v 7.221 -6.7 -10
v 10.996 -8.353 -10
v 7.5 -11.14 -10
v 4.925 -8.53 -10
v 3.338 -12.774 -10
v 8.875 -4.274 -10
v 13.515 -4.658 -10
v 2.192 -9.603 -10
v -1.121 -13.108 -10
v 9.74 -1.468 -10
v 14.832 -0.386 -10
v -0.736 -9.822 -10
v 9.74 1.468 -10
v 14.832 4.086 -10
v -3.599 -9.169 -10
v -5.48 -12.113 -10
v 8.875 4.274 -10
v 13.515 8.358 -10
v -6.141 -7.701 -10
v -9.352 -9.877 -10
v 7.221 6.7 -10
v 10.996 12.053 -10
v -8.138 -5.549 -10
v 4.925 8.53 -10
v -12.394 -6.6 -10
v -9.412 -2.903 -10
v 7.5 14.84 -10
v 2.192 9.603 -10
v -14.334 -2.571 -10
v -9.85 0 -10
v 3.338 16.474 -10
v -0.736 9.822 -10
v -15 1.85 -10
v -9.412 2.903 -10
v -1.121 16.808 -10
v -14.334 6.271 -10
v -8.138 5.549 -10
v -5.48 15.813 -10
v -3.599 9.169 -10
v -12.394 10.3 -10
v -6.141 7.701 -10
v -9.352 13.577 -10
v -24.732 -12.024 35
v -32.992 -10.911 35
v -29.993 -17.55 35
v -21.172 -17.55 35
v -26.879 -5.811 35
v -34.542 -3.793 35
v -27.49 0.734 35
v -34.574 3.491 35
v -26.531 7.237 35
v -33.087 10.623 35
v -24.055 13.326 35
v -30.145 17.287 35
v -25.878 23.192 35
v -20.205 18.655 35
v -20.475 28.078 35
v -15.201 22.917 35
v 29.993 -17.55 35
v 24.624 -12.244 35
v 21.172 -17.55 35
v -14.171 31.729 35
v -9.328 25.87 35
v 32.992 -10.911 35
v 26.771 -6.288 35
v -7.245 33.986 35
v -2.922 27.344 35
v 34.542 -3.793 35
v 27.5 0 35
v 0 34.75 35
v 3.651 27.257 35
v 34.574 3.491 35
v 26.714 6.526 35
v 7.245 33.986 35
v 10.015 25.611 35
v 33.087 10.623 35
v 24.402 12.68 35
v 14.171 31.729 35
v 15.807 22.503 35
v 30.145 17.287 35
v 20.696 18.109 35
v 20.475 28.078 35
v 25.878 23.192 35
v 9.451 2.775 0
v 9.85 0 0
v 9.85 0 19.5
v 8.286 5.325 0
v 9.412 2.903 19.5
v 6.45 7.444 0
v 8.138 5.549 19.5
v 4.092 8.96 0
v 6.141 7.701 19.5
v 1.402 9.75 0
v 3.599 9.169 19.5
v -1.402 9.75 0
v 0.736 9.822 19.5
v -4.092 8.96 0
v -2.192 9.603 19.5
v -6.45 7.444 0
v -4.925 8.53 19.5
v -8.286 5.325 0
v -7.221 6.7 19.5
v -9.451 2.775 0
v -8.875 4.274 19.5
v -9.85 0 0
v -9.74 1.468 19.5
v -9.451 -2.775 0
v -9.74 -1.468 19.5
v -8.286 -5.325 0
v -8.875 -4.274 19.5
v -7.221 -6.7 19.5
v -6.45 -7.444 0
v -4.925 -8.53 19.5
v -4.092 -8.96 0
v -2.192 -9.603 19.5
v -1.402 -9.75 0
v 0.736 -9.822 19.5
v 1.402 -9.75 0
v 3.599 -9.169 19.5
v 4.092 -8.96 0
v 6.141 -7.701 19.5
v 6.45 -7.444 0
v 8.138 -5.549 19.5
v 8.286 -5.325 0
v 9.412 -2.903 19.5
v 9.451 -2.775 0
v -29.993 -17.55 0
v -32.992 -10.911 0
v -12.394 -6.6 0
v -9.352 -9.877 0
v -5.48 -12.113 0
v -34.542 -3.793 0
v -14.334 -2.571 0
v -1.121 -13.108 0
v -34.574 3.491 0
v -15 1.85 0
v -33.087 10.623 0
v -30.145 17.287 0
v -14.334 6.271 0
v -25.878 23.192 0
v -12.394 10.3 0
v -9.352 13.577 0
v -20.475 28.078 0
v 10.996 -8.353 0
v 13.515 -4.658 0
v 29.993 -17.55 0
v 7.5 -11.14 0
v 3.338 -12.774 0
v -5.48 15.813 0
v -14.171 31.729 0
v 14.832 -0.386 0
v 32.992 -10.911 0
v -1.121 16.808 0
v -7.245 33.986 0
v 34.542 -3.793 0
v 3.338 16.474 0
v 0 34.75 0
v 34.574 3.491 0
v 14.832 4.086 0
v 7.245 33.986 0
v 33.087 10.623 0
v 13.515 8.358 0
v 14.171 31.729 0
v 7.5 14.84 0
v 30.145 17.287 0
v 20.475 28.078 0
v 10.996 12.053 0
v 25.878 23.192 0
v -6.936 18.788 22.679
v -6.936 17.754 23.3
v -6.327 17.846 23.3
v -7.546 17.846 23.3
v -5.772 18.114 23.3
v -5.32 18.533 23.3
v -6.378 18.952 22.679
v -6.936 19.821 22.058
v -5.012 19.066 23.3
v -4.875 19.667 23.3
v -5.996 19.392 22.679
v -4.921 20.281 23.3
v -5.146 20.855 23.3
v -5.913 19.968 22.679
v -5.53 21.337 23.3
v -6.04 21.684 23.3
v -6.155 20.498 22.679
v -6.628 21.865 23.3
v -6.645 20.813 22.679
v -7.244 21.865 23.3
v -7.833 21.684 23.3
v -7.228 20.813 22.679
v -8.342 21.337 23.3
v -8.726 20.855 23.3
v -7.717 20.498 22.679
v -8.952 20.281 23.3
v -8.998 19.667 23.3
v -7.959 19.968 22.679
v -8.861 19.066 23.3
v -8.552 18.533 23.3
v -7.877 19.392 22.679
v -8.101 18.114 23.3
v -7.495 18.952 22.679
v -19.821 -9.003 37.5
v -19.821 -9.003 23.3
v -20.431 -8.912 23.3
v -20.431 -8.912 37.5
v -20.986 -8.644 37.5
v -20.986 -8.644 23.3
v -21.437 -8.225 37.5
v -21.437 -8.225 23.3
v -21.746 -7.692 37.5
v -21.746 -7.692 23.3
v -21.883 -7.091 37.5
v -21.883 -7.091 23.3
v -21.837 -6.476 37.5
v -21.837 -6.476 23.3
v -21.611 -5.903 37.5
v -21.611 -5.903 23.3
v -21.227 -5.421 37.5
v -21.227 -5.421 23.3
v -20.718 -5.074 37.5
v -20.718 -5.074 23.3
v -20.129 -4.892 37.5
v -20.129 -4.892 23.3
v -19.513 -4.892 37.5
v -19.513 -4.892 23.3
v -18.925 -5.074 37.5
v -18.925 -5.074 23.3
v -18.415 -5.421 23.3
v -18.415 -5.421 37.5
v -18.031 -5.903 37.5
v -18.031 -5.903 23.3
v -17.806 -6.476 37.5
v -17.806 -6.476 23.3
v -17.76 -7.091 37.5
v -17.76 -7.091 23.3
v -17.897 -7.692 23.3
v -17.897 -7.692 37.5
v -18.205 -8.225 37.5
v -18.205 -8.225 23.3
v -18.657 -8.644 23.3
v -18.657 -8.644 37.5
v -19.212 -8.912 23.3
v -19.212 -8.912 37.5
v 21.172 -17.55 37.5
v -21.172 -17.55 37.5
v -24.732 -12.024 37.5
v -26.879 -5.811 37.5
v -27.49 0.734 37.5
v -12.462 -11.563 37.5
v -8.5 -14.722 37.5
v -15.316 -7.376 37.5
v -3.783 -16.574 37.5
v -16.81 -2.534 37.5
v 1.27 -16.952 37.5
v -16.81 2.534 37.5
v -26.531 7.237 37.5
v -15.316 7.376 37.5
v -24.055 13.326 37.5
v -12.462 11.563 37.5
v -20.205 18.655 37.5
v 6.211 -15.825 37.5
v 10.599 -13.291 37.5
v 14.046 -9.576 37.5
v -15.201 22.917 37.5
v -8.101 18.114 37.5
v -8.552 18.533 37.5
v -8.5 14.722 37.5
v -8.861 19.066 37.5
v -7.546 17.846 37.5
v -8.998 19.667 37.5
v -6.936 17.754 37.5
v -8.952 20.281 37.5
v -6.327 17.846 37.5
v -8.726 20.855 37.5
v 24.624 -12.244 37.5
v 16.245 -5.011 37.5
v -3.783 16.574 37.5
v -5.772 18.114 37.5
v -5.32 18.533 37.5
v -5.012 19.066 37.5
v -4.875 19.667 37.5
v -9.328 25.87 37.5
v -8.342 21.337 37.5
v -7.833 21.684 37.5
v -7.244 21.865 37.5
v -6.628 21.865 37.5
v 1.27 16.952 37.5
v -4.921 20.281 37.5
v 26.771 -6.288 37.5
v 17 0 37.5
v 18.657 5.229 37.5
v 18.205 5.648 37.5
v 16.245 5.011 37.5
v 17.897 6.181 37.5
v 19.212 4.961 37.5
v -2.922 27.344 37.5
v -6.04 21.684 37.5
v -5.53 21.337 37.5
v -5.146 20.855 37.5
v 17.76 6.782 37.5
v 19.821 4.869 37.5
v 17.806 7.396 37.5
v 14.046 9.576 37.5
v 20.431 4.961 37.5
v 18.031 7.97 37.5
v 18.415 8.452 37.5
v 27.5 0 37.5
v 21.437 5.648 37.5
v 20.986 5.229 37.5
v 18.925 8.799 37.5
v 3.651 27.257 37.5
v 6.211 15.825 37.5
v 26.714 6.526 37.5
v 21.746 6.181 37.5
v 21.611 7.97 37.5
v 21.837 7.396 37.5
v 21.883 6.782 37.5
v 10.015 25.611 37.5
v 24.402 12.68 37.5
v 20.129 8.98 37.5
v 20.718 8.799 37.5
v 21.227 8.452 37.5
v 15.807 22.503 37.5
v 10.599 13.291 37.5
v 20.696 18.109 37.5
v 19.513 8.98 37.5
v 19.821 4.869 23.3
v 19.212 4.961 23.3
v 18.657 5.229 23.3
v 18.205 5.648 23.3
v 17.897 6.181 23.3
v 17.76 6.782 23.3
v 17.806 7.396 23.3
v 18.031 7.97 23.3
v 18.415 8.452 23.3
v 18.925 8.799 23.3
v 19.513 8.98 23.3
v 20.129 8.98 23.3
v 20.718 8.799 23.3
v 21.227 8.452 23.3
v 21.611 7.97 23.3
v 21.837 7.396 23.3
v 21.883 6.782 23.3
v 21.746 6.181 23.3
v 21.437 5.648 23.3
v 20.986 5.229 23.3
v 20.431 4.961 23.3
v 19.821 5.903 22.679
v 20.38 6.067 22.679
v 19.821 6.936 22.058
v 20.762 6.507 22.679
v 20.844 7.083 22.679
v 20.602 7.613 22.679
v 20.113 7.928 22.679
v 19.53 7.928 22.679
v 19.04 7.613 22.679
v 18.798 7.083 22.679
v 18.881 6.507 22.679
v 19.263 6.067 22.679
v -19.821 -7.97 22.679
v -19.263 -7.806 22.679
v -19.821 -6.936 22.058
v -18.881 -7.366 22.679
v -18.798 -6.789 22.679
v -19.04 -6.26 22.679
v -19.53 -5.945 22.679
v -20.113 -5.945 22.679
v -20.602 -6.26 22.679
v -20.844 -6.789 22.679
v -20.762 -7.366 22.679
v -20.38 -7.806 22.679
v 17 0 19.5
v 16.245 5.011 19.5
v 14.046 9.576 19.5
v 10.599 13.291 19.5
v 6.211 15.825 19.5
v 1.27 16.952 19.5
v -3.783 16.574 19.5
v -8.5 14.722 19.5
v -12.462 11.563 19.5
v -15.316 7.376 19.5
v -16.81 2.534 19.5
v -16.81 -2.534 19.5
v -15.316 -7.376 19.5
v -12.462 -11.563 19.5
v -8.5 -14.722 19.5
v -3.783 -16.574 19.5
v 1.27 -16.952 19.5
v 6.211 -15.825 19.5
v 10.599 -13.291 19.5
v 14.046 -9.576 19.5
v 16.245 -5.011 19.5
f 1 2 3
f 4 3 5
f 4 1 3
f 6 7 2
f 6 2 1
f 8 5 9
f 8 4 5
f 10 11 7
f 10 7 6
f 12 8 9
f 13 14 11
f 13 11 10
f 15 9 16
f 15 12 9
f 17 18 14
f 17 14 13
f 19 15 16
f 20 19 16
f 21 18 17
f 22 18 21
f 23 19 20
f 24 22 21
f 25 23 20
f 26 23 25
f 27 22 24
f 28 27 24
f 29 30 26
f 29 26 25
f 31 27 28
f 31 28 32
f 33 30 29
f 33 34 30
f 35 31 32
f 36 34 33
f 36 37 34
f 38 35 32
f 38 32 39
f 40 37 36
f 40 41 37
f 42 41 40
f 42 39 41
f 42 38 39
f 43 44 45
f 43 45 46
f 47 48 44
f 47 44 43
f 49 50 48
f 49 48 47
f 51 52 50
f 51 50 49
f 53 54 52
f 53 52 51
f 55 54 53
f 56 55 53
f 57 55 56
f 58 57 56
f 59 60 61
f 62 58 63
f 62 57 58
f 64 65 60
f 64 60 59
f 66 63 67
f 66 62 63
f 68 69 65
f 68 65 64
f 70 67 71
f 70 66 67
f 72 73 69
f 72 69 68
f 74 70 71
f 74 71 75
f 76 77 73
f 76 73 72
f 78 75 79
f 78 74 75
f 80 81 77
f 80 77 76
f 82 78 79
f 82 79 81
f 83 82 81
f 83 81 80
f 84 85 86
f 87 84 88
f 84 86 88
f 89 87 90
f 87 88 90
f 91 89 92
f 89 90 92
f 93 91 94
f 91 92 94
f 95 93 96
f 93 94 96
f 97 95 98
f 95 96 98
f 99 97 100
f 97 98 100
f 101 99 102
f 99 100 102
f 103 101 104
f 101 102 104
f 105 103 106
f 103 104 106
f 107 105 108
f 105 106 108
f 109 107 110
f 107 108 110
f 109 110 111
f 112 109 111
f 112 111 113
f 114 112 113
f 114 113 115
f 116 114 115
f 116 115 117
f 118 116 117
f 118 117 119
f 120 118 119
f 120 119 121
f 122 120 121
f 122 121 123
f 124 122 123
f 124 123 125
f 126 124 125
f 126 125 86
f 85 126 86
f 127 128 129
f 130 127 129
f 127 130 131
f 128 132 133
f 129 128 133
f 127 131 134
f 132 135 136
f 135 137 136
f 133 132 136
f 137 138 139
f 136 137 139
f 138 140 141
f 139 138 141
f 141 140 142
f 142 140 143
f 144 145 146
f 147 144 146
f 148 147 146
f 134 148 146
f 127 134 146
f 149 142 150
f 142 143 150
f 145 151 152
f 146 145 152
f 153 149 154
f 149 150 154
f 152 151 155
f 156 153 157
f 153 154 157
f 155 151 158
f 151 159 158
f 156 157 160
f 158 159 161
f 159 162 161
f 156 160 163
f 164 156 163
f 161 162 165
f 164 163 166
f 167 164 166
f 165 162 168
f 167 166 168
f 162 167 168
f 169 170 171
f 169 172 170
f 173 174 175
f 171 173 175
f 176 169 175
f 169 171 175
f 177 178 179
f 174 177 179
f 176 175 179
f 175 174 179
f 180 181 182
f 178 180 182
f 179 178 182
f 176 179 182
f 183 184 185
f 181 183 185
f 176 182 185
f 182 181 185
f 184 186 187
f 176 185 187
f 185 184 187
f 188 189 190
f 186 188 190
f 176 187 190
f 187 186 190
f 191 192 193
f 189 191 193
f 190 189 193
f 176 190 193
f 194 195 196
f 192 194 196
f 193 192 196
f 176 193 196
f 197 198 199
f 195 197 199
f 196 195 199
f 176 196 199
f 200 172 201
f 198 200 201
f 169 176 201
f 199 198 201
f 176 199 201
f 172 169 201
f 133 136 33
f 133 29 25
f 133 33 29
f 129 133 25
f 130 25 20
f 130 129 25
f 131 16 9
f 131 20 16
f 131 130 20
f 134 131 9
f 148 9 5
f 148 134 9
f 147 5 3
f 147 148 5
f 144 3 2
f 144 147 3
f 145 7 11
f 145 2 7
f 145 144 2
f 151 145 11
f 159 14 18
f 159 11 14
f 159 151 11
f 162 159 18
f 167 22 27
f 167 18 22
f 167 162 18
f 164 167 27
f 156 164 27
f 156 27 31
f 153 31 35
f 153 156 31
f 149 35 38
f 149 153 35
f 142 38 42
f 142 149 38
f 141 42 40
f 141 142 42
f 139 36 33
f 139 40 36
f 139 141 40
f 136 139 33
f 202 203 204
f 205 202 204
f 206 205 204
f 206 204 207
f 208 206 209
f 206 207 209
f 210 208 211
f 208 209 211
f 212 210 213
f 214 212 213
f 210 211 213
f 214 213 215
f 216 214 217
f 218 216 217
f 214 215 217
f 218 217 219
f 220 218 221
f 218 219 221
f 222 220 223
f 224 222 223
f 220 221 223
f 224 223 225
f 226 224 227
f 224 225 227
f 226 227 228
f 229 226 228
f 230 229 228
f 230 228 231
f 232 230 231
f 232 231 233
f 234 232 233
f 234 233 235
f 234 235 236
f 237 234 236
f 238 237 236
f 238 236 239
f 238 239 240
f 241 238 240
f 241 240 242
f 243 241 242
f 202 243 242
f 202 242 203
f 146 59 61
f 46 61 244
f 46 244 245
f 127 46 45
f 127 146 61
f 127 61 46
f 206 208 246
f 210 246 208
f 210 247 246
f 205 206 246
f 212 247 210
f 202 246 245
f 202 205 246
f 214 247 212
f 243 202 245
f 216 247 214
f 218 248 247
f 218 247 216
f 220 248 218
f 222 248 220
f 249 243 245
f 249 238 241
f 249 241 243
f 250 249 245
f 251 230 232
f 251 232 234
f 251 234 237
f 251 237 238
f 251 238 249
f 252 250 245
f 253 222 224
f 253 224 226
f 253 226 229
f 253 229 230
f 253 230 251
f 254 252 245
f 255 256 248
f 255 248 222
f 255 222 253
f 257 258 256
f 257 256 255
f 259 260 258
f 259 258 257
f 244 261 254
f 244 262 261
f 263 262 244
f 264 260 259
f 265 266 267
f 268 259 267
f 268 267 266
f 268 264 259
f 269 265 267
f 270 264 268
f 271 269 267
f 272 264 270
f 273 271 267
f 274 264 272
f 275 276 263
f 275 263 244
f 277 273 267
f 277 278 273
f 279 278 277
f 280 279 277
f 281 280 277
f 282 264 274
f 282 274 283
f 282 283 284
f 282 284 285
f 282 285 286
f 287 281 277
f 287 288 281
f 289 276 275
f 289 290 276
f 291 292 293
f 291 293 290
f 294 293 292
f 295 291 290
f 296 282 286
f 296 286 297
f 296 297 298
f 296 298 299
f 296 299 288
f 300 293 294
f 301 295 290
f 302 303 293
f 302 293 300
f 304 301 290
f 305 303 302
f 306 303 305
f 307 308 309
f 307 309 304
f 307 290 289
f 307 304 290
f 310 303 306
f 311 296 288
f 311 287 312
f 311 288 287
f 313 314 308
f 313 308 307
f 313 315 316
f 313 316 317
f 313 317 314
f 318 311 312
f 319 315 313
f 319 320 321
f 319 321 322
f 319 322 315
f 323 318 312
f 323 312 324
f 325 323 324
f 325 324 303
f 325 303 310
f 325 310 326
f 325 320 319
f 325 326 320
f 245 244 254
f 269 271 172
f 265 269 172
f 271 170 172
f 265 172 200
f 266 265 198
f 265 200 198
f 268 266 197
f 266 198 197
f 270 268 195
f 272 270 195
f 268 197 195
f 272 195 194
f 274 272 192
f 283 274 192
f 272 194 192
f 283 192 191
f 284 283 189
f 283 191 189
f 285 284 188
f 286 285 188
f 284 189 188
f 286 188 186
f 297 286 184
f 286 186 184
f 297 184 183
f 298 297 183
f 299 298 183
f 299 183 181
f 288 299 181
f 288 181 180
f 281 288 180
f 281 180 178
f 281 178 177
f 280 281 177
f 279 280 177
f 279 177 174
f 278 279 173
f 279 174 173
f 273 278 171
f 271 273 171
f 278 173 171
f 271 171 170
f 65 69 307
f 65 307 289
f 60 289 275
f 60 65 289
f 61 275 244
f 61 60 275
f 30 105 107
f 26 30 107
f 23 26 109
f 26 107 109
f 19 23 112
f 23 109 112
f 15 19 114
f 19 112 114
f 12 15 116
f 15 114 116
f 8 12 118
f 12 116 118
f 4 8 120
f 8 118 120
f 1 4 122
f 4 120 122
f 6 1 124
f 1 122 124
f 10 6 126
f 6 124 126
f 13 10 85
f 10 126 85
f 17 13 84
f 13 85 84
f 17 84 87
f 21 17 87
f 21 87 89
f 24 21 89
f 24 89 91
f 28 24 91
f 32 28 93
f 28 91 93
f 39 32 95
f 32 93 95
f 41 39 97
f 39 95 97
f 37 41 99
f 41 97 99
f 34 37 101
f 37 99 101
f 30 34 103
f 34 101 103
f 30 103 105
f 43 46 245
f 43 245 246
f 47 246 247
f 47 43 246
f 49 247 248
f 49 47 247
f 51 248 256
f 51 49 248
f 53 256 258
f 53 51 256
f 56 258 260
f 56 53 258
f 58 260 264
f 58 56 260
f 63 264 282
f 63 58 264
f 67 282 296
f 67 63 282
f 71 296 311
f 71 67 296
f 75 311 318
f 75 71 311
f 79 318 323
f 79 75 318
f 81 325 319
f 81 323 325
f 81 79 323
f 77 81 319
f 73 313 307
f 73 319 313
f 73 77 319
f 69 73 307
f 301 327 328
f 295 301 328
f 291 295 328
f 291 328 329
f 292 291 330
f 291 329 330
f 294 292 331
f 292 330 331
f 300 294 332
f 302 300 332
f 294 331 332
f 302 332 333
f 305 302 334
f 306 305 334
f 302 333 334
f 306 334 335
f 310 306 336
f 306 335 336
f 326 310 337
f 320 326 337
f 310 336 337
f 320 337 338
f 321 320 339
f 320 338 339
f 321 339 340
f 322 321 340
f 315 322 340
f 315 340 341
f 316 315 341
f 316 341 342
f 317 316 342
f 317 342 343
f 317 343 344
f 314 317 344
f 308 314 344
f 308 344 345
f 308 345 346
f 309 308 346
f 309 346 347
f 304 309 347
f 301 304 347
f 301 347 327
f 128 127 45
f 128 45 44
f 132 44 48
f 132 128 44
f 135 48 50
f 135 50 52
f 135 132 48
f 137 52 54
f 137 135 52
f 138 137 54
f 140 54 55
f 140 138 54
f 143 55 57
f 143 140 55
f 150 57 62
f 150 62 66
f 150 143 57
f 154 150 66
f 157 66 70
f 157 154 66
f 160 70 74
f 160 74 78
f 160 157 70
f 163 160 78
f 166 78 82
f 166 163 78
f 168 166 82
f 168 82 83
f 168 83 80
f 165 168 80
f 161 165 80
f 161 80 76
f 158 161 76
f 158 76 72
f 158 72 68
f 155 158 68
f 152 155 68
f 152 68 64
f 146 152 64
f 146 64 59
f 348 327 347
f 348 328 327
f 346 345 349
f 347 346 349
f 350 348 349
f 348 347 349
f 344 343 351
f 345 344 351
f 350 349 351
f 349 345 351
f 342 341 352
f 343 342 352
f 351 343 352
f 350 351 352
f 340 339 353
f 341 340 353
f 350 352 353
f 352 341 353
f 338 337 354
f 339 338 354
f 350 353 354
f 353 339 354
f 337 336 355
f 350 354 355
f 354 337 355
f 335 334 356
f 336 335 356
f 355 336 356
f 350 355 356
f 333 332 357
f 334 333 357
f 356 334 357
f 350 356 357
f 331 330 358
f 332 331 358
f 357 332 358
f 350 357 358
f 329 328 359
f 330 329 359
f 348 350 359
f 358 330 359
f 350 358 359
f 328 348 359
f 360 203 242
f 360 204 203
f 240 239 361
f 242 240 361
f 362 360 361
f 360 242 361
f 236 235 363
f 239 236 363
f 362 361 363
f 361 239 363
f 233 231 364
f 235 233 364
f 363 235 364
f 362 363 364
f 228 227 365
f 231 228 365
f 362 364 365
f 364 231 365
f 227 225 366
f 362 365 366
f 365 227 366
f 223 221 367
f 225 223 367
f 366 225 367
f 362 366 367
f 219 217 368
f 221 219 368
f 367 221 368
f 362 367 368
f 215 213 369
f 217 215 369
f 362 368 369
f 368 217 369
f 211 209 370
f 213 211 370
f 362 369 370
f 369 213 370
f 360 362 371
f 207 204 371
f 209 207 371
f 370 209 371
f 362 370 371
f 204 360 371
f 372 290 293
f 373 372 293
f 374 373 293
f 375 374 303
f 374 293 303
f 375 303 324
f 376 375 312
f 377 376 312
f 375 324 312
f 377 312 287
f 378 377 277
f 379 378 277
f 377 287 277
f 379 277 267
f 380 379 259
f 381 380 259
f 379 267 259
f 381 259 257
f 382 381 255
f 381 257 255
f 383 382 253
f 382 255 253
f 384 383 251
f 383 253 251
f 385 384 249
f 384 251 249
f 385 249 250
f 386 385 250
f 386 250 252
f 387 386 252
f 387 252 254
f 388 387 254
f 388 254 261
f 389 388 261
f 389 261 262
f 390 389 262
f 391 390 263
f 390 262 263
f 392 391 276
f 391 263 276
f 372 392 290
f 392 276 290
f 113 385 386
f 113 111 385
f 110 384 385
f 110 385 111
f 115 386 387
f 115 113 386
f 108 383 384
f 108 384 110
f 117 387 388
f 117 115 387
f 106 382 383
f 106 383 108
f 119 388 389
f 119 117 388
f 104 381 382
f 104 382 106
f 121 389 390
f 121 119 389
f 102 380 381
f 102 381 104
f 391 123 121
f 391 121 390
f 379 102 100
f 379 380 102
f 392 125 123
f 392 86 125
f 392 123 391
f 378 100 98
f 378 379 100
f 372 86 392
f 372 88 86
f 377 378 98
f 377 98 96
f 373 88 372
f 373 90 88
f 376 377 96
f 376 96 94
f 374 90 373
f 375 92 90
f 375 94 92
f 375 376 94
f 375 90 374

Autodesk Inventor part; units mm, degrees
ref_plane "YZ Plane" through (0, 0, 0) normal (1, 0, 0) x (0, 1, 0)
ref_plane "XZ Plane" through (0, 0, 0) normal (0, 1, 0) x (-1, 0, 0)
ref_plane "XY Plane" through (0, 0, 0) normal (0, 0, 1) x (1, 0, 0)
sketch "Sketch1" plane through (0, 0, 0) normal (0, 0, 1) x (1, 0, 0)
  circle A0 centre (0, 0) radius 34.75
  dimension "d0" = 69.5
extrude "Extrusion1" add sketch "Sketch1" along normal blind 35
sketch "Sketch2" plane through (0, 0, 35) normal (0, 0, 1) x (1, 0, 0)
  circle A0 centre (0, 0) radius 27.5
  dimension "d3" = 55
extrude "Extrusion2" add sketch "Sketch2" along normal blind 2.5
sketch "Sketch3" plane through (0, 0, 37.5) normal (0, 0, 1) x (1, 0, 0)
  circle A0 centre (0, 0) radius 17
  dimension "d6" = 34
extrude "Extrusion3" cut sketch "Sketch3" against normal blind 18
sketch "Sketch4" plane through (0, 0, 19.5) normal (0, 0, 1) x (1, 0, 0)
  circle A0 centre (0, 0) radius 9.85
  dimension "d9" = 19.7
extrude "Extrusion4" cut sketch "Sketch4" against normal through all
sketch "Sketch5" plane through (0, 0, 0) normal (0, 0, -1) x (-1, 0, 0)
  circle A0 centre (0, 1.85) radius 15
  circle A1 centre (0, 0) radius 9.85 projected
  circle A2 centre (0, 0) radius 34.75 projected
  point P0 (0, -13.15)
  point P1 (0, -9.85)
  point P2 (0, 16.85)
  point P3 (0, 34.75)
  point P4 (0, 9.85)
  dimension "d12" = 30
  dimension "d13" = 3.3
  dimension "d14" = 7
extrude "Extrusion5" add sketch "Sketch5" along normal blind 10 contours A0
sketch "Sketch6" plane through (0, 0, 0) normal (0, 0, -1) x (-1, 0, 0)
  circle A0 centre (0, 0) radius 34.75 projected
  line L0 (0, 34.75) -> (0, -17.55)
  line L1 (-32.813, -17.55) -> (43.7984, -17.55)
  line L2 (43.7984, -17.55) -> (43.7984, -45.8999)
  line L3 (43.7984, -45.8999) -> (-32.813, -45.8999)
  line L4 (-32.813, -45.8999) -> (-32.813, -17.55)
  dimension "d17" = 52.3
extrude "Extrusion6" cut sketch "Sketch6" against normal through all contours L1 L2 L3 L4 A0 | A0 L1
sketch "Sketch7" plane through (0, 0, 37.5) normal (0, 0, 1) x (1, 0, 0)
  circle A0 centre (-6.9364, 19.8214) radius 2.25 projected
  circle A1 centre (19.8214, 6.9364) radius 2.25 projected
  circle A2 centre (-19.8214, -6.9364) radius 2.25 projected
  point P0 (0, 0)
hole "Hole1" at (-6.9364, 19.8214, 37.5) at (-19.8214, -6.9364, 37.5) at (19.8214, 6.9364, 37.5) direction (0, 0, -1) diameter 4.134 depth 14.2 tip angle 118 thread size "M5x0.8" class "6H" standard "ISO Metric profile"
properties part number "Ross Made spacer"
